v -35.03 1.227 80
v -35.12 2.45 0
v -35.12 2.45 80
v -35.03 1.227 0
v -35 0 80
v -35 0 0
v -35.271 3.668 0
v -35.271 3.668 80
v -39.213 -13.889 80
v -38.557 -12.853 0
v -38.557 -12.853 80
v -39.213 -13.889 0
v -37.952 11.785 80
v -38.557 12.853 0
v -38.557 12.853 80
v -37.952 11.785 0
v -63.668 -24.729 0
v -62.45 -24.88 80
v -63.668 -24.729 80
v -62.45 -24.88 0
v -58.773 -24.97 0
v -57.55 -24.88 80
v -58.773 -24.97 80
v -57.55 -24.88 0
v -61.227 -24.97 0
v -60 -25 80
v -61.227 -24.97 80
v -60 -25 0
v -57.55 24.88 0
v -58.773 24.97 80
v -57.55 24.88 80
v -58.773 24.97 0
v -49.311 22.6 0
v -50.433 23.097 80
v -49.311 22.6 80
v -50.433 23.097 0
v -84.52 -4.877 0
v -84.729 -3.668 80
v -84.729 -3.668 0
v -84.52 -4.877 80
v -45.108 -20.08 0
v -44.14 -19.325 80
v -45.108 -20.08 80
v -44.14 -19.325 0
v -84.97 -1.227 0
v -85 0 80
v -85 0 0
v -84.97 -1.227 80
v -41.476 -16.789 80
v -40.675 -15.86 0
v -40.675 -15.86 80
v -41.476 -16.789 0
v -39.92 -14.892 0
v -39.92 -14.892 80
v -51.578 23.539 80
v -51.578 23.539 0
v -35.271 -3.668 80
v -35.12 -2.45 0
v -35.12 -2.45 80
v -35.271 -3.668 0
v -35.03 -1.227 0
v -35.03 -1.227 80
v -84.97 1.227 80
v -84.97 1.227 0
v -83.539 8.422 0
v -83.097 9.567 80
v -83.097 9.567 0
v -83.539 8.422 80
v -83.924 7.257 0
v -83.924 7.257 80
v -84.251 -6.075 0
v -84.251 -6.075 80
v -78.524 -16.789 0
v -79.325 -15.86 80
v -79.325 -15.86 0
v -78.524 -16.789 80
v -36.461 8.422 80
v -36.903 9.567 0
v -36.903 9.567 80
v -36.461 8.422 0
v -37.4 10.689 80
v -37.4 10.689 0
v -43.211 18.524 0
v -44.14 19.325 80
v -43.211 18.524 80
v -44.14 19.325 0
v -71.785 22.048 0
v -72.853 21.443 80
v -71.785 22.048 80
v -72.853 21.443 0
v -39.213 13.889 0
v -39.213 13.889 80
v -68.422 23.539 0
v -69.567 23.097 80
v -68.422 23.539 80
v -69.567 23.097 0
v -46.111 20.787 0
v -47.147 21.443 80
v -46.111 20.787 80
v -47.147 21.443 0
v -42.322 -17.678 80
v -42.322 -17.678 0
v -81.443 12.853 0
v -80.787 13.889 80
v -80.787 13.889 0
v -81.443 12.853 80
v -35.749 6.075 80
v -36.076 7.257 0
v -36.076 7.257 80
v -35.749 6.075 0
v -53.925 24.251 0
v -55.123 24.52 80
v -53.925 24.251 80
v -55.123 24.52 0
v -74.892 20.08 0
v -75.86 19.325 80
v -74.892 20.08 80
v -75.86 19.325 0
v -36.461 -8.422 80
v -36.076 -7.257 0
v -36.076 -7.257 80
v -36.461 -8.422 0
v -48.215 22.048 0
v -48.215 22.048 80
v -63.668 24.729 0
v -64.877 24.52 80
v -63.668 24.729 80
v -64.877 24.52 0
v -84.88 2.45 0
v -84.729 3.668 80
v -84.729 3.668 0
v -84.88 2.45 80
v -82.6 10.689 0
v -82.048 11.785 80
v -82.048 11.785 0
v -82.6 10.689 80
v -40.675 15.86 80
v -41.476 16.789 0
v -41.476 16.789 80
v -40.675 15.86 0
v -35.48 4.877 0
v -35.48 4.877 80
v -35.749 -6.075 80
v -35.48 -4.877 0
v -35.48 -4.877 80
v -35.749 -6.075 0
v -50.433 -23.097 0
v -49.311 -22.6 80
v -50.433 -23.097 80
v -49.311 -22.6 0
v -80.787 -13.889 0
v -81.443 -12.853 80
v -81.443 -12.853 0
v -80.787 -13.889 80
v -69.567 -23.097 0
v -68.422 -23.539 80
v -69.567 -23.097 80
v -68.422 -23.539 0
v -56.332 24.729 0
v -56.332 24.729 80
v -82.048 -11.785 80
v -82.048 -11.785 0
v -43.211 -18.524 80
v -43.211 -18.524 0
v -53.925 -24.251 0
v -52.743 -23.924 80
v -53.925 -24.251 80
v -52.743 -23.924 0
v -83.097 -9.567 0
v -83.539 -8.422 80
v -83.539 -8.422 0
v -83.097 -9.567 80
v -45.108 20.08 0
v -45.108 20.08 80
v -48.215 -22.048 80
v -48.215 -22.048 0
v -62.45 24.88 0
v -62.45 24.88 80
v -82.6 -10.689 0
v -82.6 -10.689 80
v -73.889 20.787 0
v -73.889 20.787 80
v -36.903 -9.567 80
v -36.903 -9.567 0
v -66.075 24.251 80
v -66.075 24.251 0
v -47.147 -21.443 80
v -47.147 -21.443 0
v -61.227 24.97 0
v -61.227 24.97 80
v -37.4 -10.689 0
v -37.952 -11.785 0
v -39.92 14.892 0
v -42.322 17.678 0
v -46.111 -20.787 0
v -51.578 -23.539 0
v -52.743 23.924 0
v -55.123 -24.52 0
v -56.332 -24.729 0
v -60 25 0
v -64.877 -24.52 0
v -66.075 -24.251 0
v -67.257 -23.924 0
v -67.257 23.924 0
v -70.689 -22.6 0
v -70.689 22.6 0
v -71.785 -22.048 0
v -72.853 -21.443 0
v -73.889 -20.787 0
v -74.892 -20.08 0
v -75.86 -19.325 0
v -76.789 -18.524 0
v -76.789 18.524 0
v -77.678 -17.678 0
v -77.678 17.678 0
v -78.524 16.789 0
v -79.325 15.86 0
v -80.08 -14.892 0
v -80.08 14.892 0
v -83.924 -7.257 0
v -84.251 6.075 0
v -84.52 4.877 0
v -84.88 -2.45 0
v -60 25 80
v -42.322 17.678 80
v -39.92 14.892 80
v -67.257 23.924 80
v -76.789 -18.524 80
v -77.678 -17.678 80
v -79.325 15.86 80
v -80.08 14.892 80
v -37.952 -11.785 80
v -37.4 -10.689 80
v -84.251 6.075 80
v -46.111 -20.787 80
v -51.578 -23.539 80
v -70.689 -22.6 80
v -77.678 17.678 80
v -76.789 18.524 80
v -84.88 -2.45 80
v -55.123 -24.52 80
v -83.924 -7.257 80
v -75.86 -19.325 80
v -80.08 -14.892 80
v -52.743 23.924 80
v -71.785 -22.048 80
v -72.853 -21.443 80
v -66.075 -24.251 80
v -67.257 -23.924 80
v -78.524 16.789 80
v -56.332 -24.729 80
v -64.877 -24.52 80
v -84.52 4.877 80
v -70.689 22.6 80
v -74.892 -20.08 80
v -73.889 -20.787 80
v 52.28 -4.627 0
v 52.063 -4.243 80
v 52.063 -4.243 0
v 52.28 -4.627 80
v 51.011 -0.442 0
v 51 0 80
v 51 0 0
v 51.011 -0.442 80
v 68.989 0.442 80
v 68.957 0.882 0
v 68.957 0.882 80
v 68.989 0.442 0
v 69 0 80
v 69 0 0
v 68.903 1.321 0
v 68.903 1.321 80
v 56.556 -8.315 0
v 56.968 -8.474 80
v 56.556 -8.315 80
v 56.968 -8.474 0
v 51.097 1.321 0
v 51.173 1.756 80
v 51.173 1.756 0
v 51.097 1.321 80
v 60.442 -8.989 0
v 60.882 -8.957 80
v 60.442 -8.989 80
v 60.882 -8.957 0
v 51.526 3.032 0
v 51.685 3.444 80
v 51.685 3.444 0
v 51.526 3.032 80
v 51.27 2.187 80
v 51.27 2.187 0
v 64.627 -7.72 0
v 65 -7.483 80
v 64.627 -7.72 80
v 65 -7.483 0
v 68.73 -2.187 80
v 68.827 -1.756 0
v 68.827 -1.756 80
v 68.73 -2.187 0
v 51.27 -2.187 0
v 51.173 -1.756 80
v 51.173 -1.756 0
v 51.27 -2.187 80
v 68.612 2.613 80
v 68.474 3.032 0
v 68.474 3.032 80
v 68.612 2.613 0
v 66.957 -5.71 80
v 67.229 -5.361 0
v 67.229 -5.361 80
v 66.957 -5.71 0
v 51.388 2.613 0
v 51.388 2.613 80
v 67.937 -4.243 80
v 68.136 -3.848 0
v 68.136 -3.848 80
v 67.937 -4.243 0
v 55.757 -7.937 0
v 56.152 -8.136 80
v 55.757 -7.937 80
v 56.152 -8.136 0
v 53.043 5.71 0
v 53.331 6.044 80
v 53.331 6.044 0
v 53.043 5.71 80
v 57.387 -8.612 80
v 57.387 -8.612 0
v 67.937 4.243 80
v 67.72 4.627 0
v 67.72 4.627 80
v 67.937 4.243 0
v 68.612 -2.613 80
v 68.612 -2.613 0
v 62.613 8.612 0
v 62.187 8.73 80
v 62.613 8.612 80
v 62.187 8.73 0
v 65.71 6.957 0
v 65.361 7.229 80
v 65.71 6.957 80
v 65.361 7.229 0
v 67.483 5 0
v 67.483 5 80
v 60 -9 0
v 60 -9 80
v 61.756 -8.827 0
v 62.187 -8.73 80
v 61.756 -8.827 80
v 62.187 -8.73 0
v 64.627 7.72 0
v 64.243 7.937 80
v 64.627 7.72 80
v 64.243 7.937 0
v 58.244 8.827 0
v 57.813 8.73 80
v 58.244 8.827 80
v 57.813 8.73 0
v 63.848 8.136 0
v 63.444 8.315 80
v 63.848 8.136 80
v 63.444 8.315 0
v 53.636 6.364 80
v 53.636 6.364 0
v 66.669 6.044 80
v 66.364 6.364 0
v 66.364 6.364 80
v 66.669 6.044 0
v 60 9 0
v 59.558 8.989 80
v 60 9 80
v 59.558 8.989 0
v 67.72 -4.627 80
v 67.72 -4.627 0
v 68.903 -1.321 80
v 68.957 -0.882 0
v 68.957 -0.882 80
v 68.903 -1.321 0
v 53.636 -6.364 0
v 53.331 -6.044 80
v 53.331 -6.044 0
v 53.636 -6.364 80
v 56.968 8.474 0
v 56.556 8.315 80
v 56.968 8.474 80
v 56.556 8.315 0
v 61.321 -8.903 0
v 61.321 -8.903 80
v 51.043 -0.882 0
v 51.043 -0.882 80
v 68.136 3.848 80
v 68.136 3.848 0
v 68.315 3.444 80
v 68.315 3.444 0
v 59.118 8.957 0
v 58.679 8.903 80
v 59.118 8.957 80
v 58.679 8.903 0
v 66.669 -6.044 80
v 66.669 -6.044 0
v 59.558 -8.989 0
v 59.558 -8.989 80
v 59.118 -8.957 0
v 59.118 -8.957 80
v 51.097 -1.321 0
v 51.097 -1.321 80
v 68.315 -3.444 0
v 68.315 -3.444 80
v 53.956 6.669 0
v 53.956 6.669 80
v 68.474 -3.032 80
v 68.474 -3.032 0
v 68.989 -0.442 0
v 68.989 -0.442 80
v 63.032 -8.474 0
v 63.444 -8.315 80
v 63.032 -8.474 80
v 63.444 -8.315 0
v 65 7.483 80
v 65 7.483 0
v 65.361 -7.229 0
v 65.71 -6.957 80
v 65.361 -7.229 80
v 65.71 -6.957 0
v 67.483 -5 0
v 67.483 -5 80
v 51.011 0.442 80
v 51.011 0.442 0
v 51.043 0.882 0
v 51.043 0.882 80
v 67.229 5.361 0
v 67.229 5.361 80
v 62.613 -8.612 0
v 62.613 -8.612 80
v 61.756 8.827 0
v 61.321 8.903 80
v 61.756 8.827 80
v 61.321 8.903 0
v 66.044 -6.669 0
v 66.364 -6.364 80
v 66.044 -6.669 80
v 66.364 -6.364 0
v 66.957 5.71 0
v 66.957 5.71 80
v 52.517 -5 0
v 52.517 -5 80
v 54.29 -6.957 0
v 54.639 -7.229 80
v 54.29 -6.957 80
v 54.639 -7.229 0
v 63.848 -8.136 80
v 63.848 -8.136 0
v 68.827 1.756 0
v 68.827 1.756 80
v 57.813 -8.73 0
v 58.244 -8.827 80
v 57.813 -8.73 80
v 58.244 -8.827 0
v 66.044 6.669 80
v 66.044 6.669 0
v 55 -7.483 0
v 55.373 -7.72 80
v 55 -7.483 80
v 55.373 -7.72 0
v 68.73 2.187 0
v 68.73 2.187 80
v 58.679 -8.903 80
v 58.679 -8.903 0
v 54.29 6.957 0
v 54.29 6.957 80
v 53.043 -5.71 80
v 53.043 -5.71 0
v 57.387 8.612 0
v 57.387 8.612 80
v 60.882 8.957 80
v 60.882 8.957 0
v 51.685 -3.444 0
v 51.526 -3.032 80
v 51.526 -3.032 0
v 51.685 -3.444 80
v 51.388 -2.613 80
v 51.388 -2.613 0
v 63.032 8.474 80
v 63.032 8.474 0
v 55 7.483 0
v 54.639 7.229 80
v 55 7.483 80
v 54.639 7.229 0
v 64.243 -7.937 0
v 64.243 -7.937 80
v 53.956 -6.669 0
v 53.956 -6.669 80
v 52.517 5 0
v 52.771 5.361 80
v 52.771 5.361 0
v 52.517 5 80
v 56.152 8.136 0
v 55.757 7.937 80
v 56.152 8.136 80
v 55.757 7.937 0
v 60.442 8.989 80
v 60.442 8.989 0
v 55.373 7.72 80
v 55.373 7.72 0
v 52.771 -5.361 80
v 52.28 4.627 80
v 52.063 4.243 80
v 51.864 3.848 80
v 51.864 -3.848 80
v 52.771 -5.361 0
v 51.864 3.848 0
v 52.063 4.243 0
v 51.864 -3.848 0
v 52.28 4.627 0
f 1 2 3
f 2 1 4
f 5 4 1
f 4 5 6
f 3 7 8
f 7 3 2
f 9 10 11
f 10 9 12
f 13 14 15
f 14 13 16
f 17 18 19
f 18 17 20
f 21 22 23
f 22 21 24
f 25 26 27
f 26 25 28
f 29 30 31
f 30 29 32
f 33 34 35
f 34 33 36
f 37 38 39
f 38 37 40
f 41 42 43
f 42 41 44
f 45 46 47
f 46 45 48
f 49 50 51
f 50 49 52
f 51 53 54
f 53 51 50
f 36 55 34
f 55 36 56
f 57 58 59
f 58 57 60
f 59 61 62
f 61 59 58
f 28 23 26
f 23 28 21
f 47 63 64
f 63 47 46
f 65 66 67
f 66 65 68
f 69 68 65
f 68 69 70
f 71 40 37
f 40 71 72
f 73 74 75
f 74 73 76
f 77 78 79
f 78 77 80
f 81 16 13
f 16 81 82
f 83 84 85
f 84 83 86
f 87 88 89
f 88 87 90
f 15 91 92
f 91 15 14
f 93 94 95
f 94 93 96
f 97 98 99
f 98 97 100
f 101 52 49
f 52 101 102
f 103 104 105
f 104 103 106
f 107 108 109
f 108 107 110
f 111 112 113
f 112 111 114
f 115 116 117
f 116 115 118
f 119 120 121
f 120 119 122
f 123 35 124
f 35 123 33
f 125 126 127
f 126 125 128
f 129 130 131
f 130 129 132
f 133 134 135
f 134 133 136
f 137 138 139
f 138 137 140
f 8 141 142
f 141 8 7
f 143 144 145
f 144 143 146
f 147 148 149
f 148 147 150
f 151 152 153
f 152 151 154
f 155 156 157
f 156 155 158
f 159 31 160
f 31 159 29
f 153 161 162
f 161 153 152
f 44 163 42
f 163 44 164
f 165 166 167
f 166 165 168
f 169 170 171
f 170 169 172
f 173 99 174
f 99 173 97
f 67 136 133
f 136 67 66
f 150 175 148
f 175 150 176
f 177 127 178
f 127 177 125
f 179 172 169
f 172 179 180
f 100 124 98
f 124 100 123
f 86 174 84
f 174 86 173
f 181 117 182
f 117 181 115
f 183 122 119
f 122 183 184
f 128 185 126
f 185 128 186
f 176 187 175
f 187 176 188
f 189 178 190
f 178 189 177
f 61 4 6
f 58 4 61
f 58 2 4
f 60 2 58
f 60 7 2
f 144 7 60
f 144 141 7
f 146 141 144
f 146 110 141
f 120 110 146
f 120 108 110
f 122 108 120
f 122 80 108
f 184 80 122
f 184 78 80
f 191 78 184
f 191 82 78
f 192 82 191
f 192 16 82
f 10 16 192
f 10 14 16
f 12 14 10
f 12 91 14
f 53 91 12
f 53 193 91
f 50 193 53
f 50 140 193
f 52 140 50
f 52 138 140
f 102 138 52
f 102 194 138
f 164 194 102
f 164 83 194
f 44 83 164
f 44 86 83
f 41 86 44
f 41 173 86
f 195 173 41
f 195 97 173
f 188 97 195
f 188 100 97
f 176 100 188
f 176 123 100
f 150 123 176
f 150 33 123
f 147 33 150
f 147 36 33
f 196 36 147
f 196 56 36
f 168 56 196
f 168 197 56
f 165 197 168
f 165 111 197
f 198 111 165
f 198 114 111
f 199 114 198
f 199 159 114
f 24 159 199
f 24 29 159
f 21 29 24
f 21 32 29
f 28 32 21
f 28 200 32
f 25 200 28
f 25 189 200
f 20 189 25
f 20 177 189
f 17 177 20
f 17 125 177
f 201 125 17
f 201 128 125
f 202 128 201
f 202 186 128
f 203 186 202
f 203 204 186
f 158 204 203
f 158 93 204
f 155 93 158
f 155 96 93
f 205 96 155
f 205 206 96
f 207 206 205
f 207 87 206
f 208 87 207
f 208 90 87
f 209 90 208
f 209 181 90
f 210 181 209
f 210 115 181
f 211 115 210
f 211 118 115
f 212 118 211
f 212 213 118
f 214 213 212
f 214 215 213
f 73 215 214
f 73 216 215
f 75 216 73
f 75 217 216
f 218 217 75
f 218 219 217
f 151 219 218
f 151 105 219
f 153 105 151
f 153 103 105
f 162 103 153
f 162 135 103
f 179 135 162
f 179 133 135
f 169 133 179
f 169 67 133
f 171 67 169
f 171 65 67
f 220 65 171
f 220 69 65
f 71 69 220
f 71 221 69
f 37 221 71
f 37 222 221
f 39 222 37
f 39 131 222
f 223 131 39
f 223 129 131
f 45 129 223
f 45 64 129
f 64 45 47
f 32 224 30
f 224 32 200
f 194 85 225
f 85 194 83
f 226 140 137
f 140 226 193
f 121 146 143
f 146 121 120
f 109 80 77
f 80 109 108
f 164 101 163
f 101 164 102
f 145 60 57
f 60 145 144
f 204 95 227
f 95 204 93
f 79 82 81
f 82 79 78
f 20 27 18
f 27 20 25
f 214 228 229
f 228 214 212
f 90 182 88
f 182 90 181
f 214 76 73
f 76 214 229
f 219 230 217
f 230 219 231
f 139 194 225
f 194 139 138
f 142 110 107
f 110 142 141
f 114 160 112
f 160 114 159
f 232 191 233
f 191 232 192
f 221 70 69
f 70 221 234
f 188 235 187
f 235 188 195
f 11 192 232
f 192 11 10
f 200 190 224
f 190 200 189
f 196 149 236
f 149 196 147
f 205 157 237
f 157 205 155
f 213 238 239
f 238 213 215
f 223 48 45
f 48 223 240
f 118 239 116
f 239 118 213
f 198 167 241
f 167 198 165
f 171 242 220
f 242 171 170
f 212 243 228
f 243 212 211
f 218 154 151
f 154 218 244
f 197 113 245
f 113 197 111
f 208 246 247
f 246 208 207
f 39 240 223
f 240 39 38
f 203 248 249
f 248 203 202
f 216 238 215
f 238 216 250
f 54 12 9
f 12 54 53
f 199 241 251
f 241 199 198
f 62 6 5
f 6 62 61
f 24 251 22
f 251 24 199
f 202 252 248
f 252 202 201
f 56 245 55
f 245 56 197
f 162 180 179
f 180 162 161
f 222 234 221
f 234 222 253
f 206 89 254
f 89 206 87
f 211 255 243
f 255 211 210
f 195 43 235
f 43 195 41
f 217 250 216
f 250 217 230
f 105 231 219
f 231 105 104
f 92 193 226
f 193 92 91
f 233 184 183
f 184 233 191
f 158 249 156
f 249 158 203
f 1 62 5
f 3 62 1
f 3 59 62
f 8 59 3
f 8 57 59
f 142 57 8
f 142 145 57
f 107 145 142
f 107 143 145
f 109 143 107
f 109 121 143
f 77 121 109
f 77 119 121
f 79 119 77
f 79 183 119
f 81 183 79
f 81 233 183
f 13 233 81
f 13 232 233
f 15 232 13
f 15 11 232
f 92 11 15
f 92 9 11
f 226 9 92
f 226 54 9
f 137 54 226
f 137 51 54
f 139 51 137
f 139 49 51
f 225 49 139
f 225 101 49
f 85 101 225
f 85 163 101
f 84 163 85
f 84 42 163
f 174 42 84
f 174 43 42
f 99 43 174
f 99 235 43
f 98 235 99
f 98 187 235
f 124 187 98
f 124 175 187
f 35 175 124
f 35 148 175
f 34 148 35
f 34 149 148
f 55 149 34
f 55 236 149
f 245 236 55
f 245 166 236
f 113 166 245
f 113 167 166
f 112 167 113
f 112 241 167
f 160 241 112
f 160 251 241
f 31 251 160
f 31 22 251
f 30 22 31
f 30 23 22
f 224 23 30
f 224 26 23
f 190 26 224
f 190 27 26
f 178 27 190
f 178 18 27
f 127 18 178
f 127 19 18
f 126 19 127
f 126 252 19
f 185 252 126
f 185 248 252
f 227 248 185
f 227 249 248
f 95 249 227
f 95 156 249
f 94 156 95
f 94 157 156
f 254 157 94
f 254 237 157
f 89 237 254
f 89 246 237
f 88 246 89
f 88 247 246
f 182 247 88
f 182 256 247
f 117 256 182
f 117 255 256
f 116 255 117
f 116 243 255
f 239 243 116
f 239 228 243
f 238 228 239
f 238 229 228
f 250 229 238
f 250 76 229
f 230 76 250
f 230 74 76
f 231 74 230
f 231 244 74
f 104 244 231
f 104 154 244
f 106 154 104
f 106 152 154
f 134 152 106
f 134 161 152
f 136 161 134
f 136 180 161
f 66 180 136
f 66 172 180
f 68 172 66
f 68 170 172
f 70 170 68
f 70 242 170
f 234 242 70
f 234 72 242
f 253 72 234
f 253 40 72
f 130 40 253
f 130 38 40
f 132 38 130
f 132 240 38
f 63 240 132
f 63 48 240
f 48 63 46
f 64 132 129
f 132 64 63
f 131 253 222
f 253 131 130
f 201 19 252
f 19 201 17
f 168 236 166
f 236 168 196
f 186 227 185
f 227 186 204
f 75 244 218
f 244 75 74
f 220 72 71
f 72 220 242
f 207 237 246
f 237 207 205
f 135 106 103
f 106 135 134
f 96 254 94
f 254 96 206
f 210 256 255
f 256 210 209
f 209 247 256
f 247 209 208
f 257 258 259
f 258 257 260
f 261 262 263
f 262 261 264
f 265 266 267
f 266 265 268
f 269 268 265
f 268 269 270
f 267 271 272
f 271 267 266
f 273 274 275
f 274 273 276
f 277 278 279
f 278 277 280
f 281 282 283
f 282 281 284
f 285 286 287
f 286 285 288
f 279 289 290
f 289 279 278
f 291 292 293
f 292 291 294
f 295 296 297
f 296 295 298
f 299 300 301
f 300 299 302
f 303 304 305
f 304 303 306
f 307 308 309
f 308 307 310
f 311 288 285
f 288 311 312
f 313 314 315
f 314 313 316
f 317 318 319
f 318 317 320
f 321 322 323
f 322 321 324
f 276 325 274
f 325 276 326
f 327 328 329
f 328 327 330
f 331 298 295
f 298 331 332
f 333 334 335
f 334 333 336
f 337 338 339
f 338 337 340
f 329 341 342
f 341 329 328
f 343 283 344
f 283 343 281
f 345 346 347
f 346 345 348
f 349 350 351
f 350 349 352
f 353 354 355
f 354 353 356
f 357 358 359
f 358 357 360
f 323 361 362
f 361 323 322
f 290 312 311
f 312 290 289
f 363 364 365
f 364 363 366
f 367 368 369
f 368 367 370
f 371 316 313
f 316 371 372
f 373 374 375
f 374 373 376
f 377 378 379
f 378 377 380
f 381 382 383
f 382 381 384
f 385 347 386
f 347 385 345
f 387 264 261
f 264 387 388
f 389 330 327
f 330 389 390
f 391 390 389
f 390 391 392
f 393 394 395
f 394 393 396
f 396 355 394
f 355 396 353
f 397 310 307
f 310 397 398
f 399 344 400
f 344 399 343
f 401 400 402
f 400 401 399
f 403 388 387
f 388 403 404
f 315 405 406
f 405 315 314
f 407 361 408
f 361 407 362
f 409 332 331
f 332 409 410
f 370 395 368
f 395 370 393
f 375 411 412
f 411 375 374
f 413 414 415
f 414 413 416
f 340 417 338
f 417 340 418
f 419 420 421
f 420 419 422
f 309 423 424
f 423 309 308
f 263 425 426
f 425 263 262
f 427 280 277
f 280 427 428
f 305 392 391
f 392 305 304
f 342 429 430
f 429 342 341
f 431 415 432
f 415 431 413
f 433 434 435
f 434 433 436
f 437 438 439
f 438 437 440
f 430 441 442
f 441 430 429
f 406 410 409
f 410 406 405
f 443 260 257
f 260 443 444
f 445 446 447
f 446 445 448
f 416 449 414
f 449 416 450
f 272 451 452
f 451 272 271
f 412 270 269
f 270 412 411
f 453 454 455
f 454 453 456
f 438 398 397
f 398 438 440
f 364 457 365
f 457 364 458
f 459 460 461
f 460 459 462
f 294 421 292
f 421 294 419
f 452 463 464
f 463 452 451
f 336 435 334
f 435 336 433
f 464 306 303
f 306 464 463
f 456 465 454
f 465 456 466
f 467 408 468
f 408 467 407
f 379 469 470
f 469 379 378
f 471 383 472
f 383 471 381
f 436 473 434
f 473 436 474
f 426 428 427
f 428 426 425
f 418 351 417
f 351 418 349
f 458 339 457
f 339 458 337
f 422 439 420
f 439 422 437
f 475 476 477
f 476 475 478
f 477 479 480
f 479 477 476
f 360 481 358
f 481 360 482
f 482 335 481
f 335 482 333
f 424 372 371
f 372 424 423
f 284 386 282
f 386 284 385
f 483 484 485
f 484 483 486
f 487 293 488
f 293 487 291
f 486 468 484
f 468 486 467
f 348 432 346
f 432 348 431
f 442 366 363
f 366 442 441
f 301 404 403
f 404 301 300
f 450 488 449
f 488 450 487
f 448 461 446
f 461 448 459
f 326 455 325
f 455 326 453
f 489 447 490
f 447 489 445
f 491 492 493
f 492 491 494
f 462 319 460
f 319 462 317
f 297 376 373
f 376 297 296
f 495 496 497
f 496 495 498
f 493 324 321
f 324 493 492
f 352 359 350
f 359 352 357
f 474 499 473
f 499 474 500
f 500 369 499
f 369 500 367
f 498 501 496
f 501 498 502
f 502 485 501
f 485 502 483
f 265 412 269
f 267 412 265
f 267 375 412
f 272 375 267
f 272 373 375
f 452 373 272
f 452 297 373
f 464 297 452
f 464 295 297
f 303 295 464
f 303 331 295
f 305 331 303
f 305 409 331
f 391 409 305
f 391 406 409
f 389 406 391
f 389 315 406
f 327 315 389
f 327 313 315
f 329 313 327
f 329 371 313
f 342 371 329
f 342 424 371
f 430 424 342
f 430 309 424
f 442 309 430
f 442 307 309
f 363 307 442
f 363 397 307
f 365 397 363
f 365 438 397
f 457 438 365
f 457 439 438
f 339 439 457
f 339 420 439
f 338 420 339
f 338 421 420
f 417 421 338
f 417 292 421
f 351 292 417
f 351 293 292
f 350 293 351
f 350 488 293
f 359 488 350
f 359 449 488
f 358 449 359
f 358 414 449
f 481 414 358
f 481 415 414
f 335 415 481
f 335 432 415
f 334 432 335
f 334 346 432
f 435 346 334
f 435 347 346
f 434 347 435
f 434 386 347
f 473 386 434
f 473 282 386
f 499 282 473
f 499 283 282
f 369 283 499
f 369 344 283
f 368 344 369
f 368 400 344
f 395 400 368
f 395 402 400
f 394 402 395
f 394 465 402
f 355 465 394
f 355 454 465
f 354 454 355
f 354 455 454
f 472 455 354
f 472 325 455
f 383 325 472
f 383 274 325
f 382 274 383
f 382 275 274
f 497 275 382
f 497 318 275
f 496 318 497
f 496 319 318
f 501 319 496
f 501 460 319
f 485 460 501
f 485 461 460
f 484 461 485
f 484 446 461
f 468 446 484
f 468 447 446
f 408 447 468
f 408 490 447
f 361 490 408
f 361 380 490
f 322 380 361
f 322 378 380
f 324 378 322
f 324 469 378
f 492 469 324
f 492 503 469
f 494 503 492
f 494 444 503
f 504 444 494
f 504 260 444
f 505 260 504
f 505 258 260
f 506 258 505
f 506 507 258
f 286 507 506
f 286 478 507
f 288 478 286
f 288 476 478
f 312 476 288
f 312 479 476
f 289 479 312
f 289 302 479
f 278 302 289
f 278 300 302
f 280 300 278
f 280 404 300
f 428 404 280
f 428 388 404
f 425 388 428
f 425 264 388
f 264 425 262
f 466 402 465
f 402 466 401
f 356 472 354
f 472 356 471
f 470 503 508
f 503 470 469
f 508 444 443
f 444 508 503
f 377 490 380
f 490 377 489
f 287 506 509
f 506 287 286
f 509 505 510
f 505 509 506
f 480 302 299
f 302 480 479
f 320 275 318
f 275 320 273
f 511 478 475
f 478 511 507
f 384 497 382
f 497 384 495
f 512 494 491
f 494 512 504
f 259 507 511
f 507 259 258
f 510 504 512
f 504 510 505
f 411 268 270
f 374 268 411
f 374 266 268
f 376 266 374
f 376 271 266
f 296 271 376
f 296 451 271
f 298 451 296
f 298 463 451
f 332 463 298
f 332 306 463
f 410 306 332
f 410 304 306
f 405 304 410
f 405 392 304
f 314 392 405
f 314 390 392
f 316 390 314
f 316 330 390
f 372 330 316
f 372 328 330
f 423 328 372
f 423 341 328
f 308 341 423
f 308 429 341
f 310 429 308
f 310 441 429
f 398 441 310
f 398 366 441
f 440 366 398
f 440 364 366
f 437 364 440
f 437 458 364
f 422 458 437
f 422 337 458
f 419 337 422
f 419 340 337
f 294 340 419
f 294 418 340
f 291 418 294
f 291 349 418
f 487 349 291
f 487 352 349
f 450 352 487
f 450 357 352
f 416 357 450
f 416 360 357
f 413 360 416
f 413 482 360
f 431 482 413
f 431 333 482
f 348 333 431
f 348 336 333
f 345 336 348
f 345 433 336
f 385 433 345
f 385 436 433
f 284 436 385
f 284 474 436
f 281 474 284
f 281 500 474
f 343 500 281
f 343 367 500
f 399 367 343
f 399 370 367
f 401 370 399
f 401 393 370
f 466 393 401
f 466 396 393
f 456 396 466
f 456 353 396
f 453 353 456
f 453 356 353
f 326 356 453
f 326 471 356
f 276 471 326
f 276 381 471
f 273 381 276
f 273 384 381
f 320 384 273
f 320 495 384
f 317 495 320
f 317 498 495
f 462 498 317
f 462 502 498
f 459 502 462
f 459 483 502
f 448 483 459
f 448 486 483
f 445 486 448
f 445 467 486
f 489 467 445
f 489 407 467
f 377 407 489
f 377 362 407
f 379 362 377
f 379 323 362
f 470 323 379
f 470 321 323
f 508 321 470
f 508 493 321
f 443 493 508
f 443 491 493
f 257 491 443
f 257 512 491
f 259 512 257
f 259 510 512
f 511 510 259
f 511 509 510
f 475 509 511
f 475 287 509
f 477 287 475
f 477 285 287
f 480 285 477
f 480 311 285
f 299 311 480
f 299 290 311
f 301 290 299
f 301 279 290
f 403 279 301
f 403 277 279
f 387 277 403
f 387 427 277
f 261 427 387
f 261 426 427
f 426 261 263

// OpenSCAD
// mandrels.scad
// 两个 mandrel 示例：50 mm 和 18 mm（单位：mm）
// 参数化，调整 diameter 与 length 即可

$fn = 128; // 平滑度（导出 STL 时可降低/提高）
module mandrel(diameter=50, length=80, end_chamfer=2) {
  r = diameter/2;
  // 中心实心芯
  translate([0,0,0]) cylinder(h=length, r=r, center=false);
  // 两端倒角（做为差集避免尖锐）
  translate([0,0,length-end_chamfer]) rotate([0,0,0]) cylinder(h=end_chamfer, r1=r, r2=r-0.01);
  translate([0,0,0]) rotate([0,0,0]) cylinder(h=end_chamfer, r1=r, r2=r-0.01);
}

// 示例：两件 mandrel 放在同一文件中，便于一次渲染/导出
// 保存时可注释掉不需要的一个或移动到原点导出
// Mandrel for large vessel (50 mm)
translate([-60,0,0]) mandrel(diameter=50, length=80);

// Mandrel for small vessel (18 mm)
translate([60,0,0]) mandrel(diameter=18, length=80);
